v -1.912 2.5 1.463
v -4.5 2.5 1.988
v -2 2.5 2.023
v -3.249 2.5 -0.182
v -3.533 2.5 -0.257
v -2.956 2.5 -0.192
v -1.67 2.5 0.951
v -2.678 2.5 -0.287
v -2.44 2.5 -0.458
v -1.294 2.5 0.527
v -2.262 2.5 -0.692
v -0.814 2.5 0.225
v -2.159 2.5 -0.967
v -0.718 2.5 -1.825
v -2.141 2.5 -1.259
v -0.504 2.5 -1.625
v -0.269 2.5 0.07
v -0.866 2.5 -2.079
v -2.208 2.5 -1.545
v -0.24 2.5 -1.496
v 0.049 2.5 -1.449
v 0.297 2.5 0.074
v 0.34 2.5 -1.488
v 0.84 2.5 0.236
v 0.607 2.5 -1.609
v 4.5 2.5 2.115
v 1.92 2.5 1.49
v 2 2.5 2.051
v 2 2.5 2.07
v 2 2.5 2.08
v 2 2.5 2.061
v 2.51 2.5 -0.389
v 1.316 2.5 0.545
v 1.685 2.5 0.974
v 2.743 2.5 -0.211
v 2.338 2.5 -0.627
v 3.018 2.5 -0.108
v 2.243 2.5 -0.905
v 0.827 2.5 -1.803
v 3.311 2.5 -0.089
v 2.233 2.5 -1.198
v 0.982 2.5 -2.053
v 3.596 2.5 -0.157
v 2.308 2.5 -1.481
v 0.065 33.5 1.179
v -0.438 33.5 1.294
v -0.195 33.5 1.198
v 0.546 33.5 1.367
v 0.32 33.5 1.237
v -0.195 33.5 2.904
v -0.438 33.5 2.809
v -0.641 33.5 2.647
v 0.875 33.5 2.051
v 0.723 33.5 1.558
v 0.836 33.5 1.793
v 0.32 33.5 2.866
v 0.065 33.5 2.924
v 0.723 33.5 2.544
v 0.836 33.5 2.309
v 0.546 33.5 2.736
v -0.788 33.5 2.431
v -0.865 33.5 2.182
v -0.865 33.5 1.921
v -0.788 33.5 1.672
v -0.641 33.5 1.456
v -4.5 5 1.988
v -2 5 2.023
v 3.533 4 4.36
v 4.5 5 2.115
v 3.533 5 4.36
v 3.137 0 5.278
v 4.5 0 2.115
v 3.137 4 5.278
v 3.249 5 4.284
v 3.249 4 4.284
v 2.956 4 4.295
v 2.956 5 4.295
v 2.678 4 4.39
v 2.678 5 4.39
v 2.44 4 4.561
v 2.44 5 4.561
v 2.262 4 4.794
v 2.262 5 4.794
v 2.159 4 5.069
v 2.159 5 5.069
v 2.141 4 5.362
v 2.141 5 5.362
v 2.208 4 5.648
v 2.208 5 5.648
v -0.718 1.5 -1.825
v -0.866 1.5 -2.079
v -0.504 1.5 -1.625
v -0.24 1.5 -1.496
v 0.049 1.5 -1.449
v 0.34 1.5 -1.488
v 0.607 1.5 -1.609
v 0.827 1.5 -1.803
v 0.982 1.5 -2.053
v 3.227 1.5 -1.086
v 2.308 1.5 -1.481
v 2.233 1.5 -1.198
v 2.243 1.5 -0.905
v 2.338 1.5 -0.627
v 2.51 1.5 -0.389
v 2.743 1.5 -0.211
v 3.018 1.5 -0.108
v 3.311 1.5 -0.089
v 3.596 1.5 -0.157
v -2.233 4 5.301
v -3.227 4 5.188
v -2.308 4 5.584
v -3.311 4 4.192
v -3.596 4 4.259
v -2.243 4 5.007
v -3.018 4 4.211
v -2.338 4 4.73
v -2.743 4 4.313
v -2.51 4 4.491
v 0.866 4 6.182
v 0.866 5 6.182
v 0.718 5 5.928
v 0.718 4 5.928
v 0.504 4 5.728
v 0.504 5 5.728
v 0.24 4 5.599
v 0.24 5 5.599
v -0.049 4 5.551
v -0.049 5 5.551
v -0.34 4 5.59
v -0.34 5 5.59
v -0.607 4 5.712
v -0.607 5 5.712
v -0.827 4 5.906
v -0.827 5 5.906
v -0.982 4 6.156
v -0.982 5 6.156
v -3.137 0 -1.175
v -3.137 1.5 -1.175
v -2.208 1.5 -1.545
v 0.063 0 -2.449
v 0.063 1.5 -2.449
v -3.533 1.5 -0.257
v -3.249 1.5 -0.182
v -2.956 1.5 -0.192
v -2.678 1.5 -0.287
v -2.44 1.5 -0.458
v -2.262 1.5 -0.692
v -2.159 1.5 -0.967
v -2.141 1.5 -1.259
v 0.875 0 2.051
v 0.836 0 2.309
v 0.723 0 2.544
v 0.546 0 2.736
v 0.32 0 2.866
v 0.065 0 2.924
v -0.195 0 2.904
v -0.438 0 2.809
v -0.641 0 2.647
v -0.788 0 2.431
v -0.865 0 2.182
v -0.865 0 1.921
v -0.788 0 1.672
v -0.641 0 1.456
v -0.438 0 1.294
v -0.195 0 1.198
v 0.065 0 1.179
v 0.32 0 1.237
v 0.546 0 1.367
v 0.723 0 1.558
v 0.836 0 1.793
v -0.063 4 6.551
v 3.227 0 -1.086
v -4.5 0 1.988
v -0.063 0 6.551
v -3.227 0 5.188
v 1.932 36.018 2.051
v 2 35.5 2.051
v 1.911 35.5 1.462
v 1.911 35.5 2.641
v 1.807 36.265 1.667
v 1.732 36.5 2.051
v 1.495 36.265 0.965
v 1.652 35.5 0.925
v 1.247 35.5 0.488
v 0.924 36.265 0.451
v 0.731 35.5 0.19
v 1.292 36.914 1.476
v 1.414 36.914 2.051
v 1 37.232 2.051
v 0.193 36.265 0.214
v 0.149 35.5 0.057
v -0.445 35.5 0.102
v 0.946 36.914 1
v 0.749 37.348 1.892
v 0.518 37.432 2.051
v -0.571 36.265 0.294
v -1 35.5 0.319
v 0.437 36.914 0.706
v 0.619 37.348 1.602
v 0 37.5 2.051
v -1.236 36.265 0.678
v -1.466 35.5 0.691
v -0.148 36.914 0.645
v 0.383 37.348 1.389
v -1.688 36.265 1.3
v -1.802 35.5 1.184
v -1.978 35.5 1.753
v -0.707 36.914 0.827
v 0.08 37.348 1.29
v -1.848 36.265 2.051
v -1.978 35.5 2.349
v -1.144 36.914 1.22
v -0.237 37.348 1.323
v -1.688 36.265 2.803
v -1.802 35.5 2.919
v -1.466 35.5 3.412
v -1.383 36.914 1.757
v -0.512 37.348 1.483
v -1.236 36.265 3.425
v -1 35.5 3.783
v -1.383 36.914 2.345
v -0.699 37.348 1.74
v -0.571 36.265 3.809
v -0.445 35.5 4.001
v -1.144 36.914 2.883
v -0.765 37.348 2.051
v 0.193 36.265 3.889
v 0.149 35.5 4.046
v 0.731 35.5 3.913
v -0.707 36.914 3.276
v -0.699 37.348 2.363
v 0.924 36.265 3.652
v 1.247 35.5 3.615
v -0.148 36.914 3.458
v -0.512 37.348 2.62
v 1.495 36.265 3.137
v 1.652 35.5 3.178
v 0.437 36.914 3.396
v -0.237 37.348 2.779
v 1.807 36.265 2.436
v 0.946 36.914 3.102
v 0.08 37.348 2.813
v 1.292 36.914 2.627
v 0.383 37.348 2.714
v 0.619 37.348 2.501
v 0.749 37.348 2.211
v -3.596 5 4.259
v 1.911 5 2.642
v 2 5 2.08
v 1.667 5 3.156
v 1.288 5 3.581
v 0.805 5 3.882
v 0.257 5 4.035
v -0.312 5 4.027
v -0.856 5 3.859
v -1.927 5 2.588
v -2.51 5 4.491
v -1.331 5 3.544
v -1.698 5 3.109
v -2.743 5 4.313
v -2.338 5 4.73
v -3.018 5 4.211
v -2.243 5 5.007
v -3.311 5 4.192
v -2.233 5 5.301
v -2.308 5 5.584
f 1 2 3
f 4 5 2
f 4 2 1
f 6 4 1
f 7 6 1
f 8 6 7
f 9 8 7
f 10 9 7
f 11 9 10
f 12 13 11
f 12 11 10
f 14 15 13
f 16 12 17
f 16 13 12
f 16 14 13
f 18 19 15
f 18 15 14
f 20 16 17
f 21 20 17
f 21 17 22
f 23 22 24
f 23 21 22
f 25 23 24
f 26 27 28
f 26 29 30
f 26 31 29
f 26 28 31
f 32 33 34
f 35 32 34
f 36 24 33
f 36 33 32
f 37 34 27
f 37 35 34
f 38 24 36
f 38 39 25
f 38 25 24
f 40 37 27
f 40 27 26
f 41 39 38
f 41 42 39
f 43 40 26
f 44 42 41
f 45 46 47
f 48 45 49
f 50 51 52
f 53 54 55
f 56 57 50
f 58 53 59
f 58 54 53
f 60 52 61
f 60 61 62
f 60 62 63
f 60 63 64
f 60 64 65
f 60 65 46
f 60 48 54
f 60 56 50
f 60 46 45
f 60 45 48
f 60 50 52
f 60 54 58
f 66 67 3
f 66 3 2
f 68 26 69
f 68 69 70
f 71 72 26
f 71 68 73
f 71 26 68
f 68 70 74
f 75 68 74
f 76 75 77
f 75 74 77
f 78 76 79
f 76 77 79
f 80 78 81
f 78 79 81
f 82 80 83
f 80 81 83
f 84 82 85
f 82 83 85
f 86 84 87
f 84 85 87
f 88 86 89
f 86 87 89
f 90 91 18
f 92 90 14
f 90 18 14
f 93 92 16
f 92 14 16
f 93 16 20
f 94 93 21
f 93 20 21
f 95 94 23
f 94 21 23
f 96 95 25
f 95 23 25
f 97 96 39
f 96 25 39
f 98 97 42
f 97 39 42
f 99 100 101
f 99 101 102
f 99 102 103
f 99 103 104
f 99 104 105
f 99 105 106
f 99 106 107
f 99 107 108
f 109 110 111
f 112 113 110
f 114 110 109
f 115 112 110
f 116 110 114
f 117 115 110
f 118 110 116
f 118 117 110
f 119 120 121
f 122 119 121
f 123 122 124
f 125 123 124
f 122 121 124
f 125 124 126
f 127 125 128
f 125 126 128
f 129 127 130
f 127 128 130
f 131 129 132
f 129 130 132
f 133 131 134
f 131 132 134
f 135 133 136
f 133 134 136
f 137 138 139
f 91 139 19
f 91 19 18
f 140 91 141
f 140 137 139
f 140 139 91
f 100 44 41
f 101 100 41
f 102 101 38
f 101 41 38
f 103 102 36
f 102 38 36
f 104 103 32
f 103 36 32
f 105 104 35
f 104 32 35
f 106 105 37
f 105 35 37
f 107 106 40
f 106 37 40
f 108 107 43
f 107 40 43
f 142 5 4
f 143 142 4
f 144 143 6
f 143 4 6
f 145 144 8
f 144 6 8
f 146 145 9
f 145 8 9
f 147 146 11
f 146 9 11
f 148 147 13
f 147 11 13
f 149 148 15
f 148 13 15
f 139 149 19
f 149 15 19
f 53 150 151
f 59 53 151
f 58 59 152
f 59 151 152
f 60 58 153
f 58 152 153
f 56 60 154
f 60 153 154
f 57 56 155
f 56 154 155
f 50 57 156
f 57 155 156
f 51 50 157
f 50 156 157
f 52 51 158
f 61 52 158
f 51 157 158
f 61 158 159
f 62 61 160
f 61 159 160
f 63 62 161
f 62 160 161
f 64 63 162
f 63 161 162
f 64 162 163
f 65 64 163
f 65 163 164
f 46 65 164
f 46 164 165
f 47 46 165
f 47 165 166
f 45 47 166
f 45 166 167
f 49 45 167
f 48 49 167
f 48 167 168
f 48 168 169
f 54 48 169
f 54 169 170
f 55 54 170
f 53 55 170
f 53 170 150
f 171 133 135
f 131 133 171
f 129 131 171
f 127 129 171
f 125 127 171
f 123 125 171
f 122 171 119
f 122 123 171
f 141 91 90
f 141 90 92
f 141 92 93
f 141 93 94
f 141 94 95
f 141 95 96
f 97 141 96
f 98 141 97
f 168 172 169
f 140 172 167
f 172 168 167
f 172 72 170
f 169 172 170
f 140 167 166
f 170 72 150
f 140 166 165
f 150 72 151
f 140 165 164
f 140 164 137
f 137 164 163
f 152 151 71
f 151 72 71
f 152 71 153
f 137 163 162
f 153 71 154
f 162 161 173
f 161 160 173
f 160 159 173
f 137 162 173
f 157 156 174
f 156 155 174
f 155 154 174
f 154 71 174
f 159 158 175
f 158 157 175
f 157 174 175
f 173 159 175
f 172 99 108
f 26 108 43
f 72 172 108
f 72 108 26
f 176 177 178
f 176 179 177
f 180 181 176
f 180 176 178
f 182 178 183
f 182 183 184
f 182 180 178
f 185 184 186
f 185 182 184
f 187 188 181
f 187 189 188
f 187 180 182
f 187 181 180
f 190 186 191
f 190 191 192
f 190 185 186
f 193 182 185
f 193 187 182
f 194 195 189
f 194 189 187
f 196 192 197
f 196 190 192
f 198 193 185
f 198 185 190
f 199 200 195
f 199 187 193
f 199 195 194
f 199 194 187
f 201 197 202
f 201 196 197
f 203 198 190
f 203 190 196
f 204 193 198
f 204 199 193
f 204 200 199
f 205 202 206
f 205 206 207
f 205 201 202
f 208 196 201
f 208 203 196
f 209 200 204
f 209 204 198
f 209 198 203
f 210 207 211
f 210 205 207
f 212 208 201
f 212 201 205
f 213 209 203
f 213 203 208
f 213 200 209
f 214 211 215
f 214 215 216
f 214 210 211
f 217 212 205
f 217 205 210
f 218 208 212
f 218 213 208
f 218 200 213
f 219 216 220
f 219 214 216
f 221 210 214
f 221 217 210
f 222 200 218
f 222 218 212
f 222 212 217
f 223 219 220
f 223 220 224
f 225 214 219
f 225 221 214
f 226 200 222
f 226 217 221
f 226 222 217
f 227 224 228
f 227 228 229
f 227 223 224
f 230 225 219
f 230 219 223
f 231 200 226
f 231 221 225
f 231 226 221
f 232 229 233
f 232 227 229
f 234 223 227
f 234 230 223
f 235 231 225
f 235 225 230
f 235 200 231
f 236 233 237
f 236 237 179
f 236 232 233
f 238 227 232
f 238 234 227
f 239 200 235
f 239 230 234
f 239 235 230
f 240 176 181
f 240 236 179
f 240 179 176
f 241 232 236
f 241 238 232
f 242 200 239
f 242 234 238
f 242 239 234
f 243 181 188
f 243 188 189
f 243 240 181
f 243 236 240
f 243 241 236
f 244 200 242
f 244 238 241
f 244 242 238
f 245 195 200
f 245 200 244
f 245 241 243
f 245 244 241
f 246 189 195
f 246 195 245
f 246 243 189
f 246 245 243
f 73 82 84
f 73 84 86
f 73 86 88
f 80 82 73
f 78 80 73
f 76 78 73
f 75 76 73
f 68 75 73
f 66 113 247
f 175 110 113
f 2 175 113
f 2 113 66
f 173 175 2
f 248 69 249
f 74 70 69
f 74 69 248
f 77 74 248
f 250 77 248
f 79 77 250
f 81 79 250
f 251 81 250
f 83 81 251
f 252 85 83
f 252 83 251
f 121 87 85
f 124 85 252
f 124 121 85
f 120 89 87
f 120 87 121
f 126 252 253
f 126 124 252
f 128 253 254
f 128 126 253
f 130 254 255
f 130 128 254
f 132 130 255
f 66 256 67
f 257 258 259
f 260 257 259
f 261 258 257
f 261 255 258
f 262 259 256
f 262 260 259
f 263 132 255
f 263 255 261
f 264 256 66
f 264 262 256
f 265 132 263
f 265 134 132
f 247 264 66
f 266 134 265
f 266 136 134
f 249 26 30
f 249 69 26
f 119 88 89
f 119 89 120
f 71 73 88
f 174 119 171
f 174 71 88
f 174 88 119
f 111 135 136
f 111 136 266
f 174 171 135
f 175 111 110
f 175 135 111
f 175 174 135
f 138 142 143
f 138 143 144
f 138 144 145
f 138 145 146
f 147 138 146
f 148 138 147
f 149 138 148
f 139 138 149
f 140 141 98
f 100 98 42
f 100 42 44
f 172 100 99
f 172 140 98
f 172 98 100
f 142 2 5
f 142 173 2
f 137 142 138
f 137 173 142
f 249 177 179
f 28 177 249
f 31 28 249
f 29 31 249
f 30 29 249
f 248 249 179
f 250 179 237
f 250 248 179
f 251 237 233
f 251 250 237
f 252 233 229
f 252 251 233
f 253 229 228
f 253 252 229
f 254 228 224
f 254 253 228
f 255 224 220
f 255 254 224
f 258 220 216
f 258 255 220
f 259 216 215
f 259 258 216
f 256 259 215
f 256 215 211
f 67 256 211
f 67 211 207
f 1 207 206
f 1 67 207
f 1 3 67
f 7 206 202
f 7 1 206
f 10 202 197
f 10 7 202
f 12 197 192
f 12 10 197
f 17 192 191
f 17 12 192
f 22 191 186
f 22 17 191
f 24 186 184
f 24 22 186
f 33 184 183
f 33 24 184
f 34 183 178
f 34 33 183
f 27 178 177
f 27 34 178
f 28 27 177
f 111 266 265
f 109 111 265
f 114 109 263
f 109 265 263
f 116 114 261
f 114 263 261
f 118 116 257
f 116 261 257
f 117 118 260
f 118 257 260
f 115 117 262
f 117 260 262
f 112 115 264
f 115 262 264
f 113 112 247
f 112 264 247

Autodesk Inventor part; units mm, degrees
ref_plane "YZ Plane" through (0, 0, 0) normal (1, 0, 0) x (0, 1, 0)
ref_plane "XZ Plane" through (0, 0, 0) normal (0, 1, 0) x (-1, 0, 0)
ref_plane "XY Plane" through (0, 0, 0) normal (0, 0, 1) x (1, 0, 0)
sketch "Sketch1" plane through (0, 0, 0) normal (0, 1, 0) x (-1, 0, 0)
  line L0 (4.5, 1.988) -> (3.1372, -1.1754)
  line L1 (3.1372, -1.1754) -> (-0.0634, -2.4486)
  line L2 (-0.0634, -2.4486) -> (-3.2268, -1.0858)
  line L3 (-3.2268, -1.0858) -> (-4.5, 2.1147)
  line L4 (-4.5, 2.1147) -> (-3.1372, 5.2782)
  line L5 (-3.1372, 5.2782) -> (0.0634, 6.5514)
  line L6 (0.0634, 6.5514) -> (3.2268, 5.1885)
  line L7 (3.2268, 5.1885) -> (4.5, 1.988)
  point P0 (0, 0)
  point P1 (0, 2.0514)
  dimension "d0" = 9
extrude "Extrusion1" add sketch "Sketch1" along normal blind 5
sketch "Sketch2" plane through (0, 5, 0) normal (0, 1, 0) x (1, 0, 0)
  line L0 (-3.1372, 1.1754) -> (-4.5, -1.988) projected
  line L1 (-4.5, -1.988) -> (-3.1372, 1.1754)
  line L2 (0.0634, 2.4486) -> (-3.1372, 1.1754) projected
  line L3 (-3.1372, 1.1754) -> (0.0634, 2.4486)
  line L4 (3.2268, 1.0858) -> (0.0634, 2.4486) projected
  line L5 (0.0634, 2.4486) -> (3.2268, 1.0858)
  line L6 (4.5, -2.1147) -> (3.2268, 1.0858) projected
  line L7 (3.2268, 1.0858) -> (4.5, -2.1147)
  line L8 (4.5, -2.1147) -> (-4.5, -1.988)
  point P0 (0, 0)
extrude "Extrusion2" cut sketch "Sketch2" against normal blind 2.5
sketch "Sketch3" plane through (0, 2.5, 0) normal (0, 1, 0) x (1, 0, 0)
  line L0 (-3.1372, 1.1754) -> (0.0634, 2.4486) projected
  circle A0 centre (-3.1372, 1.1754) radius 1
  circle A1 centre (0.0634, 2.4486) radius 1
  line L1 (0.0634, 2.4486) -> (3.2268, 1.0858) projected
  circle A2 centre (3.2268, 1.0858) radius 1
  point P0 (0, 0)
  dimension "d5" = 2
  dimension "d6" = 2
  dimension "d7" = 2
extrude "Extrusion3" cut sketch "Sketch3" against normal blind 1
sketch "Sketch4" plane through (0, 5, 0) normal (0, 1, 0) x (1, 0, 0)
  line L0 (-3.2268, -5.1885) -> (-4.5, -1.988) projected
  circle A0 centre (-3.2268, -5.1885) radius 1
  line L1 (-0.0634, -6.5514) -> (-3.2268, -5.1885) projected
  circle A1 centre (-0.0634, -6.5514) radius 1
  line L2 (4.5, -2.1147) -> (3.1372, -5.2782) projected
  circle A2 centre (3.1372, -5.2782) radius 1
  point P0 (0, 0)
  dimension "d10" = 2
  dimension "d11" = 2
  dimension "d12" = 2
extrude "Extrusion4" cut sketch "Sketch4" against normal blind 1
sketch "Sketch5" plane through (0, 0, 0) normal (0, -1, 0) x (1, 0, 0)
  line L0 (4.5, 2.1147) -> (-4.5, 1.988) projected
  circle A0 centre (0, 2.0514) radius 0.875
  point P0 (0, 0)
  dimension "d15" = 1.75
extrude "Extrusion5" cut sketch "Sketch5" against normal through all
sketch "Sketch6" plane through (0, 2.5, 0) normal (0, 1, 0) x (1, 0, 0)
  arc A0 (0.8749, -2.0637) -> (-0.8749, -2.039) centre (0, -2.0514) ccw projected
  circle A1 centre (0, -2.0514) radius 2
  point P0 (0, 0)
  dimension "d18" = 4
extrude "Extrusion6" add sketch "Sketch6" along normal blind 35
sketch "Sketch7" plane through (0, 2.5, 2.0514) normal (0, -1, 0) x (1, 0, 0)
  circle A0 centre (0, 0) radius 0.875
  point P0 (0, -2.0514)
  dimension "d23" = 1.75
extrude "Extrusion7" cut sketch "Sketch7" against normal blind 31
fillet "Fillet1" radius 2 1 edges at (-2, 37.5, 2.0514)
properties part number "driver_handle"
